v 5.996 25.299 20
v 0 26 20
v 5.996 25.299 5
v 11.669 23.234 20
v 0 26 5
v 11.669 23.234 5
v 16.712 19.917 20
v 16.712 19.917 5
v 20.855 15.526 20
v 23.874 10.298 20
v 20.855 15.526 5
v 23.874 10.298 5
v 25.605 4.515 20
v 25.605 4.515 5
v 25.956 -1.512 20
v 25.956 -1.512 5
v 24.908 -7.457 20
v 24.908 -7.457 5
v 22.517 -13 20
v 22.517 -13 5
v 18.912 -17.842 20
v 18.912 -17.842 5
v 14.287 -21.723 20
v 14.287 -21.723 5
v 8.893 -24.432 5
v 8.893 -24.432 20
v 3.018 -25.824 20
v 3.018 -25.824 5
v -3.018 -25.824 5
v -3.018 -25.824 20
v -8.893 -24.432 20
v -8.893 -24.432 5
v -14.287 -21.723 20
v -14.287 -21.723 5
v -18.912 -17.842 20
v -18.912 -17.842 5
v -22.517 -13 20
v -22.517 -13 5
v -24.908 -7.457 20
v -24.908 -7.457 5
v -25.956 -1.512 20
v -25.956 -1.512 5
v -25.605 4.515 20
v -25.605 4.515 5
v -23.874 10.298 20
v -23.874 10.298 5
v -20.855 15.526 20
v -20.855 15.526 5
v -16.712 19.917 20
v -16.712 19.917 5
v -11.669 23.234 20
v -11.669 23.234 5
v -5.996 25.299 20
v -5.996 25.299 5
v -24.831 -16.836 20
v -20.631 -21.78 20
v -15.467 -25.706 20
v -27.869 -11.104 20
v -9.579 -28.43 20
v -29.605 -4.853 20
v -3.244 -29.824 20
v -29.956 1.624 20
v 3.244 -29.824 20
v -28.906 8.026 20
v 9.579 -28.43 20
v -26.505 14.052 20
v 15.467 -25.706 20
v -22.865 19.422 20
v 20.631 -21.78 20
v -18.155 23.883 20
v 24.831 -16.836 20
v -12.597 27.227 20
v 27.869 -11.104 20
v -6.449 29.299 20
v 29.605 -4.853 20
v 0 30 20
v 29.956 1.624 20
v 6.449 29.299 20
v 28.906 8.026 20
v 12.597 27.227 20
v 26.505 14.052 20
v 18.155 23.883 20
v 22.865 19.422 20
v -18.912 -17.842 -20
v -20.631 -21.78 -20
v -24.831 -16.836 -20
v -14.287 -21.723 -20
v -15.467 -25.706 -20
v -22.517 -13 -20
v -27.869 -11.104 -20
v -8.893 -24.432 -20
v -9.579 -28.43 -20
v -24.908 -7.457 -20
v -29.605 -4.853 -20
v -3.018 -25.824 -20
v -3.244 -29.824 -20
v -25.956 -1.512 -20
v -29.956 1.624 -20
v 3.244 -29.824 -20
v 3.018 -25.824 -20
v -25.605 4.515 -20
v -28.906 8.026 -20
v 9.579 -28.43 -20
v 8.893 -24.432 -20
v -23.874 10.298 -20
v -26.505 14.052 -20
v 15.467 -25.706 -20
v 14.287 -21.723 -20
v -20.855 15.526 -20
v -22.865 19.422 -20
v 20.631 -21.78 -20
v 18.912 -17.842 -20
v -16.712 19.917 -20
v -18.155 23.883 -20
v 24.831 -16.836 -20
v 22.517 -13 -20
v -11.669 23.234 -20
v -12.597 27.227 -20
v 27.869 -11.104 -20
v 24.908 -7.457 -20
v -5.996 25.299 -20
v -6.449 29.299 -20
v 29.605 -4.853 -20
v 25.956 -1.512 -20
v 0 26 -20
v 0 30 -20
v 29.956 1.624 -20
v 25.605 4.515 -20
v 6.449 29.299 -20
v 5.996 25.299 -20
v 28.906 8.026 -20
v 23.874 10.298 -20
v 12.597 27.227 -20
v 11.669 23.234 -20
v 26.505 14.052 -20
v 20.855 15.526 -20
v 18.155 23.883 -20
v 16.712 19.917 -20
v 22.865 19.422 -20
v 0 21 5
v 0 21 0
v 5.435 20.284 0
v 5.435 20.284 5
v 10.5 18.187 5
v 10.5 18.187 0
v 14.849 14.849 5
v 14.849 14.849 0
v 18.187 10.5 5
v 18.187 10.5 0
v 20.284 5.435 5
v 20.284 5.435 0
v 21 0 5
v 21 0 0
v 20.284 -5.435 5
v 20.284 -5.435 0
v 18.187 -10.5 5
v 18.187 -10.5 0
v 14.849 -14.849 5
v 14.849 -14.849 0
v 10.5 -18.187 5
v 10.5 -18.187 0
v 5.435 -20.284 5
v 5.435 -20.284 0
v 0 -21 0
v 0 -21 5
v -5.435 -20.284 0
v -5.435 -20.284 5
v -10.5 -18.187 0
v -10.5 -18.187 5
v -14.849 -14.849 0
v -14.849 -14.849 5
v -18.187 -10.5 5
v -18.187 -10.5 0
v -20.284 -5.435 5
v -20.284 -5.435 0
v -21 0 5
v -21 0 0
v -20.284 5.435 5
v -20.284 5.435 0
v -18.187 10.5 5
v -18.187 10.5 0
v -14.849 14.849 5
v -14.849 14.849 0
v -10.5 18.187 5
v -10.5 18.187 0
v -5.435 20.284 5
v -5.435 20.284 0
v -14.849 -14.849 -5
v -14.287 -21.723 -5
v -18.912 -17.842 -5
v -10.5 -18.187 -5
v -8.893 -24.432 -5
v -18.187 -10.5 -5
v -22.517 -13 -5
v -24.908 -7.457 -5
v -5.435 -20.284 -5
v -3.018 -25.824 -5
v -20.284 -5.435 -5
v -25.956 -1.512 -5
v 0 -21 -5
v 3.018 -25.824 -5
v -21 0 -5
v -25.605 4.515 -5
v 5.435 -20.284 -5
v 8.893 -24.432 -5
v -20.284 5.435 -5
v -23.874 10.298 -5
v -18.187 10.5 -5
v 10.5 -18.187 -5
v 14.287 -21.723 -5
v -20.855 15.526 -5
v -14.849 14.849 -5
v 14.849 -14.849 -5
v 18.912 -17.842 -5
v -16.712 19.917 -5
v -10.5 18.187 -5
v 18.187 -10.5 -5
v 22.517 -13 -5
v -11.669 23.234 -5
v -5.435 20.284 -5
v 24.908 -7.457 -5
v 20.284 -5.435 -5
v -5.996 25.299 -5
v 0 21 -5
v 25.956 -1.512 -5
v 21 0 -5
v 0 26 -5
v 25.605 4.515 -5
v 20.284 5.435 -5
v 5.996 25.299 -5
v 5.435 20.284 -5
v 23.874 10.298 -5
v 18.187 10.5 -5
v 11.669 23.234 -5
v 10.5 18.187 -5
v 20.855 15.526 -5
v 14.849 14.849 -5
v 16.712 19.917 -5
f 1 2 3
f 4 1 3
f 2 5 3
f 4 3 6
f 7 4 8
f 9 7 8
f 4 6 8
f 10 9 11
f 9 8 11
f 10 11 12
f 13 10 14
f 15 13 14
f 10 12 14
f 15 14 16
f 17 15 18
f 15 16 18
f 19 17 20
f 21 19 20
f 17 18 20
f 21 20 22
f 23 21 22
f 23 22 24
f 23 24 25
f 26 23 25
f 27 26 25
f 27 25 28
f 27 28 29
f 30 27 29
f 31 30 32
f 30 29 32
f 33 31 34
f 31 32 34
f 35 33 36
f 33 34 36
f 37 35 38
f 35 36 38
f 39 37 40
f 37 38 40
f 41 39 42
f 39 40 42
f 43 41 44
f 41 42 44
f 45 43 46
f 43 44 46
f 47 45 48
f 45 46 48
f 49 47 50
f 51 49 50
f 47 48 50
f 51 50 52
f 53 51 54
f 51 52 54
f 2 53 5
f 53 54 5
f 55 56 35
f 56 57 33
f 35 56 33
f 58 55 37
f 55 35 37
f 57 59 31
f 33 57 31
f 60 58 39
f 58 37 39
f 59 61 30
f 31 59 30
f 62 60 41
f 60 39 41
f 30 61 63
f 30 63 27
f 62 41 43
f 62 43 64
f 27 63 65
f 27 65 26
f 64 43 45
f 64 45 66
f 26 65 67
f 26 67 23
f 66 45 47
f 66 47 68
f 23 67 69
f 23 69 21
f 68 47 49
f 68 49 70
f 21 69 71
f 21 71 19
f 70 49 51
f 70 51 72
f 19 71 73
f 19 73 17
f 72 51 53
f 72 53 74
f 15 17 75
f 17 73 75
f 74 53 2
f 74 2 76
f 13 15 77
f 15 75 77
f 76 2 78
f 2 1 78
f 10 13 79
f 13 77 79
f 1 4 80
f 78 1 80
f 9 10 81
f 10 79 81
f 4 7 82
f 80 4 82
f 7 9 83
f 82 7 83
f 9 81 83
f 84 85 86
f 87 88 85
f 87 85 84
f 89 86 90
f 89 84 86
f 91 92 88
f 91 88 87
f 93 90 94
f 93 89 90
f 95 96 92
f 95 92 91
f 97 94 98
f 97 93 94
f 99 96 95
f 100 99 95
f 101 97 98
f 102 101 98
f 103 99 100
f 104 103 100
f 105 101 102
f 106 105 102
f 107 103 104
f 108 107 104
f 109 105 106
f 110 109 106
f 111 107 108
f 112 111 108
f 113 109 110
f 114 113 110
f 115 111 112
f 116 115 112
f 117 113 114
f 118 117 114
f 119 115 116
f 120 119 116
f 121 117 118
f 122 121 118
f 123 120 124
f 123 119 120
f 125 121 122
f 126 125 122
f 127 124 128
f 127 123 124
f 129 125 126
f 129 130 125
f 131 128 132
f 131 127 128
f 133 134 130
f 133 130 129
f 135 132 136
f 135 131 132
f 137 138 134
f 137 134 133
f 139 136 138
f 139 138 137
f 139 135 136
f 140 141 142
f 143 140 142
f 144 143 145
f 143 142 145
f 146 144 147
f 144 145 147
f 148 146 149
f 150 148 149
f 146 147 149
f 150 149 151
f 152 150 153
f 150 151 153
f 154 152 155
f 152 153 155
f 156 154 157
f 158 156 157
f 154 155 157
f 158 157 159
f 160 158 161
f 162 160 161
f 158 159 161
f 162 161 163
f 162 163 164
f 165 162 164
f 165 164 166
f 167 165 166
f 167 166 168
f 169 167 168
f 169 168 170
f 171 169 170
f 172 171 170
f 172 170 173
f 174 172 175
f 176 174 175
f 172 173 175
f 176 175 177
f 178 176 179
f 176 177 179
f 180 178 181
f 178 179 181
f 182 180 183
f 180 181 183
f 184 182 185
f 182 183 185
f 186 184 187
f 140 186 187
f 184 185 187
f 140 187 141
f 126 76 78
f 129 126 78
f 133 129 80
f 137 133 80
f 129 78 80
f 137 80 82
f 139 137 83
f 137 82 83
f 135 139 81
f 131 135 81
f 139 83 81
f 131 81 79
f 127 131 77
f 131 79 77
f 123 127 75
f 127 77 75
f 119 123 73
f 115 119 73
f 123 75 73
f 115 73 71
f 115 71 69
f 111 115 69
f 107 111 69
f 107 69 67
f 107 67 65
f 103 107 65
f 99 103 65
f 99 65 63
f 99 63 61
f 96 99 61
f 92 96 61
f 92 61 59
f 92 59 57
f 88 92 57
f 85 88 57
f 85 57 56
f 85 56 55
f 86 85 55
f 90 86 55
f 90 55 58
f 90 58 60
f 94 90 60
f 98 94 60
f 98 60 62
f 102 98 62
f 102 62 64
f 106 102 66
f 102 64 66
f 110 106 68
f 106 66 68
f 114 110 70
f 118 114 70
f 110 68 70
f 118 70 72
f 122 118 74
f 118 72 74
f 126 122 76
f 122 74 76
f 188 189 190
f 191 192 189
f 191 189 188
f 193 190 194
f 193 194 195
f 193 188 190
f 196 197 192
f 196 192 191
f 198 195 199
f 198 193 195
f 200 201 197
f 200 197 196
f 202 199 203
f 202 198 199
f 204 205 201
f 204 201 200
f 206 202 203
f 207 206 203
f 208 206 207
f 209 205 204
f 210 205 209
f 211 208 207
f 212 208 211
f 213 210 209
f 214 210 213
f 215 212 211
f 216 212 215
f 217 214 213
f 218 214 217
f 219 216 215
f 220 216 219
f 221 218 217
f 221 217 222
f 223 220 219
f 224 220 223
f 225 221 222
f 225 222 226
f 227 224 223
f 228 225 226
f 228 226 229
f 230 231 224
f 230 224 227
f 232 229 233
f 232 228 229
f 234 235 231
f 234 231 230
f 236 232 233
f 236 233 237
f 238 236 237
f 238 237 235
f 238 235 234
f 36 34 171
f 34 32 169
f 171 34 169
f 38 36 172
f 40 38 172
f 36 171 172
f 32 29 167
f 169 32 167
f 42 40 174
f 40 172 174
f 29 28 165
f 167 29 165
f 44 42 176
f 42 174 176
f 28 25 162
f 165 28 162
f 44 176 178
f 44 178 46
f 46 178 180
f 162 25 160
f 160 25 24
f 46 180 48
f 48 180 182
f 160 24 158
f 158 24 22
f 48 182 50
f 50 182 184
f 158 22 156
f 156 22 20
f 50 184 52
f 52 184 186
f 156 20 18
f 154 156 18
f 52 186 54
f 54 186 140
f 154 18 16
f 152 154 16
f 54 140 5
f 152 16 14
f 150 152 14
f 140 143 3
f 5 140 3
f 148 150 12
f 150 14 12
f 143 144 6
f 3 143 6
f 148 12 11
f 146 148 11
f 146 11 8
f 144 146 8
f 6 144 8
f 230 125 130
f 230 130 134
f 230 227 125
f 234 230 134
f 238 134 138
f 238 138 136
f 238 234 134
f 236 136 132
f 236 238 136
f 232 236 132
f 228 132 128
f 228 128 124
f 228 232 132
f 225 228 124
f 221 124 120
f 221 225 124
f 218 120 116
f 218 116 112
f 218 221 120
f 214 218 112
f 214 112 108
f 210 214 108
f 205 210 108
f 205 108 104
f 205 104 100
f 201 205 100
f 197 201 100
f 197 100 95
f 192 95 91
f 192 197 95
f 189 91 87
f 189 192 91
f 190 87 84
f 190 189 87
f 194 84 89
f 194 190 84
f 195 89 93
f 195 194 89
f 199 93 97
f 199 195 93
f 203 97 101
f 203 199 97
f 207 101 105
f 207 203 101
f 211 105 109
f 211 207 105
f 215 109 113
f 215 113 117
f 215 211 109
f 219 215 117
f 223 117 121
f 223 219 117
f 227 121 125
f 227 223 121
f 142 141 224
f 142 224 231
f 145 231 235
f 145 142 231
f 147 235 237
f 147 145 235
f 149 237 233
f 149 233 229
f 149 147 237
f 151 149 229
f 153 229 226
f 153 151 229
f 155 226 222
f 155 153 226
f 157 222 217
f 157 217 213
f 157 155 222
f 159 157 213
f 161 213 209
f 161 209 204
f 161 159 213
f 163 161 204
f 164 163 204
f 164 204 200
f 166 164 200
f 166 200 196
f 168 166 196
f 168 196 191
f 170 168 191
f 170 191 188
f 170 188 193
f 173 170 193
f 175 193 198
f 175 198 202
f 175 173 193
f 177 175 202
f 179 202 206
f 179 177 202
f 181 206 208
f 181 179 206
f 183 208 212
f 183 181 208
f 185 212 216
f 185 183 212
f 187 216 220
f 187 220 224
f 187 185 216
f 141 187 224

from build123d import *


with BuildPart() as part:
    # Эскиз1 → Повернуть1 (revolve)
    with BuildSketch(Plane(origin=(0, 0, 0), x_dir=(0, 0, -1), z_dir=(1, 0, 0))):
        Polygon((20, 30), (20, 26), (5, 26), (5, 21), (0, 21), (0, 30), align=None)
    revolve(axis=Axis((0, 0, 1000), (0, 0, -1)))

    # Зеркальное отражение1: part across plane


with BuildPart() as part_1:
    add(part.part)
    add(part.part.mirror(Plane(origin=(0, 21, 0), x_dir=(1, 0, 0), z_dir=(0, 0, -1))))


solid = part_1.part
